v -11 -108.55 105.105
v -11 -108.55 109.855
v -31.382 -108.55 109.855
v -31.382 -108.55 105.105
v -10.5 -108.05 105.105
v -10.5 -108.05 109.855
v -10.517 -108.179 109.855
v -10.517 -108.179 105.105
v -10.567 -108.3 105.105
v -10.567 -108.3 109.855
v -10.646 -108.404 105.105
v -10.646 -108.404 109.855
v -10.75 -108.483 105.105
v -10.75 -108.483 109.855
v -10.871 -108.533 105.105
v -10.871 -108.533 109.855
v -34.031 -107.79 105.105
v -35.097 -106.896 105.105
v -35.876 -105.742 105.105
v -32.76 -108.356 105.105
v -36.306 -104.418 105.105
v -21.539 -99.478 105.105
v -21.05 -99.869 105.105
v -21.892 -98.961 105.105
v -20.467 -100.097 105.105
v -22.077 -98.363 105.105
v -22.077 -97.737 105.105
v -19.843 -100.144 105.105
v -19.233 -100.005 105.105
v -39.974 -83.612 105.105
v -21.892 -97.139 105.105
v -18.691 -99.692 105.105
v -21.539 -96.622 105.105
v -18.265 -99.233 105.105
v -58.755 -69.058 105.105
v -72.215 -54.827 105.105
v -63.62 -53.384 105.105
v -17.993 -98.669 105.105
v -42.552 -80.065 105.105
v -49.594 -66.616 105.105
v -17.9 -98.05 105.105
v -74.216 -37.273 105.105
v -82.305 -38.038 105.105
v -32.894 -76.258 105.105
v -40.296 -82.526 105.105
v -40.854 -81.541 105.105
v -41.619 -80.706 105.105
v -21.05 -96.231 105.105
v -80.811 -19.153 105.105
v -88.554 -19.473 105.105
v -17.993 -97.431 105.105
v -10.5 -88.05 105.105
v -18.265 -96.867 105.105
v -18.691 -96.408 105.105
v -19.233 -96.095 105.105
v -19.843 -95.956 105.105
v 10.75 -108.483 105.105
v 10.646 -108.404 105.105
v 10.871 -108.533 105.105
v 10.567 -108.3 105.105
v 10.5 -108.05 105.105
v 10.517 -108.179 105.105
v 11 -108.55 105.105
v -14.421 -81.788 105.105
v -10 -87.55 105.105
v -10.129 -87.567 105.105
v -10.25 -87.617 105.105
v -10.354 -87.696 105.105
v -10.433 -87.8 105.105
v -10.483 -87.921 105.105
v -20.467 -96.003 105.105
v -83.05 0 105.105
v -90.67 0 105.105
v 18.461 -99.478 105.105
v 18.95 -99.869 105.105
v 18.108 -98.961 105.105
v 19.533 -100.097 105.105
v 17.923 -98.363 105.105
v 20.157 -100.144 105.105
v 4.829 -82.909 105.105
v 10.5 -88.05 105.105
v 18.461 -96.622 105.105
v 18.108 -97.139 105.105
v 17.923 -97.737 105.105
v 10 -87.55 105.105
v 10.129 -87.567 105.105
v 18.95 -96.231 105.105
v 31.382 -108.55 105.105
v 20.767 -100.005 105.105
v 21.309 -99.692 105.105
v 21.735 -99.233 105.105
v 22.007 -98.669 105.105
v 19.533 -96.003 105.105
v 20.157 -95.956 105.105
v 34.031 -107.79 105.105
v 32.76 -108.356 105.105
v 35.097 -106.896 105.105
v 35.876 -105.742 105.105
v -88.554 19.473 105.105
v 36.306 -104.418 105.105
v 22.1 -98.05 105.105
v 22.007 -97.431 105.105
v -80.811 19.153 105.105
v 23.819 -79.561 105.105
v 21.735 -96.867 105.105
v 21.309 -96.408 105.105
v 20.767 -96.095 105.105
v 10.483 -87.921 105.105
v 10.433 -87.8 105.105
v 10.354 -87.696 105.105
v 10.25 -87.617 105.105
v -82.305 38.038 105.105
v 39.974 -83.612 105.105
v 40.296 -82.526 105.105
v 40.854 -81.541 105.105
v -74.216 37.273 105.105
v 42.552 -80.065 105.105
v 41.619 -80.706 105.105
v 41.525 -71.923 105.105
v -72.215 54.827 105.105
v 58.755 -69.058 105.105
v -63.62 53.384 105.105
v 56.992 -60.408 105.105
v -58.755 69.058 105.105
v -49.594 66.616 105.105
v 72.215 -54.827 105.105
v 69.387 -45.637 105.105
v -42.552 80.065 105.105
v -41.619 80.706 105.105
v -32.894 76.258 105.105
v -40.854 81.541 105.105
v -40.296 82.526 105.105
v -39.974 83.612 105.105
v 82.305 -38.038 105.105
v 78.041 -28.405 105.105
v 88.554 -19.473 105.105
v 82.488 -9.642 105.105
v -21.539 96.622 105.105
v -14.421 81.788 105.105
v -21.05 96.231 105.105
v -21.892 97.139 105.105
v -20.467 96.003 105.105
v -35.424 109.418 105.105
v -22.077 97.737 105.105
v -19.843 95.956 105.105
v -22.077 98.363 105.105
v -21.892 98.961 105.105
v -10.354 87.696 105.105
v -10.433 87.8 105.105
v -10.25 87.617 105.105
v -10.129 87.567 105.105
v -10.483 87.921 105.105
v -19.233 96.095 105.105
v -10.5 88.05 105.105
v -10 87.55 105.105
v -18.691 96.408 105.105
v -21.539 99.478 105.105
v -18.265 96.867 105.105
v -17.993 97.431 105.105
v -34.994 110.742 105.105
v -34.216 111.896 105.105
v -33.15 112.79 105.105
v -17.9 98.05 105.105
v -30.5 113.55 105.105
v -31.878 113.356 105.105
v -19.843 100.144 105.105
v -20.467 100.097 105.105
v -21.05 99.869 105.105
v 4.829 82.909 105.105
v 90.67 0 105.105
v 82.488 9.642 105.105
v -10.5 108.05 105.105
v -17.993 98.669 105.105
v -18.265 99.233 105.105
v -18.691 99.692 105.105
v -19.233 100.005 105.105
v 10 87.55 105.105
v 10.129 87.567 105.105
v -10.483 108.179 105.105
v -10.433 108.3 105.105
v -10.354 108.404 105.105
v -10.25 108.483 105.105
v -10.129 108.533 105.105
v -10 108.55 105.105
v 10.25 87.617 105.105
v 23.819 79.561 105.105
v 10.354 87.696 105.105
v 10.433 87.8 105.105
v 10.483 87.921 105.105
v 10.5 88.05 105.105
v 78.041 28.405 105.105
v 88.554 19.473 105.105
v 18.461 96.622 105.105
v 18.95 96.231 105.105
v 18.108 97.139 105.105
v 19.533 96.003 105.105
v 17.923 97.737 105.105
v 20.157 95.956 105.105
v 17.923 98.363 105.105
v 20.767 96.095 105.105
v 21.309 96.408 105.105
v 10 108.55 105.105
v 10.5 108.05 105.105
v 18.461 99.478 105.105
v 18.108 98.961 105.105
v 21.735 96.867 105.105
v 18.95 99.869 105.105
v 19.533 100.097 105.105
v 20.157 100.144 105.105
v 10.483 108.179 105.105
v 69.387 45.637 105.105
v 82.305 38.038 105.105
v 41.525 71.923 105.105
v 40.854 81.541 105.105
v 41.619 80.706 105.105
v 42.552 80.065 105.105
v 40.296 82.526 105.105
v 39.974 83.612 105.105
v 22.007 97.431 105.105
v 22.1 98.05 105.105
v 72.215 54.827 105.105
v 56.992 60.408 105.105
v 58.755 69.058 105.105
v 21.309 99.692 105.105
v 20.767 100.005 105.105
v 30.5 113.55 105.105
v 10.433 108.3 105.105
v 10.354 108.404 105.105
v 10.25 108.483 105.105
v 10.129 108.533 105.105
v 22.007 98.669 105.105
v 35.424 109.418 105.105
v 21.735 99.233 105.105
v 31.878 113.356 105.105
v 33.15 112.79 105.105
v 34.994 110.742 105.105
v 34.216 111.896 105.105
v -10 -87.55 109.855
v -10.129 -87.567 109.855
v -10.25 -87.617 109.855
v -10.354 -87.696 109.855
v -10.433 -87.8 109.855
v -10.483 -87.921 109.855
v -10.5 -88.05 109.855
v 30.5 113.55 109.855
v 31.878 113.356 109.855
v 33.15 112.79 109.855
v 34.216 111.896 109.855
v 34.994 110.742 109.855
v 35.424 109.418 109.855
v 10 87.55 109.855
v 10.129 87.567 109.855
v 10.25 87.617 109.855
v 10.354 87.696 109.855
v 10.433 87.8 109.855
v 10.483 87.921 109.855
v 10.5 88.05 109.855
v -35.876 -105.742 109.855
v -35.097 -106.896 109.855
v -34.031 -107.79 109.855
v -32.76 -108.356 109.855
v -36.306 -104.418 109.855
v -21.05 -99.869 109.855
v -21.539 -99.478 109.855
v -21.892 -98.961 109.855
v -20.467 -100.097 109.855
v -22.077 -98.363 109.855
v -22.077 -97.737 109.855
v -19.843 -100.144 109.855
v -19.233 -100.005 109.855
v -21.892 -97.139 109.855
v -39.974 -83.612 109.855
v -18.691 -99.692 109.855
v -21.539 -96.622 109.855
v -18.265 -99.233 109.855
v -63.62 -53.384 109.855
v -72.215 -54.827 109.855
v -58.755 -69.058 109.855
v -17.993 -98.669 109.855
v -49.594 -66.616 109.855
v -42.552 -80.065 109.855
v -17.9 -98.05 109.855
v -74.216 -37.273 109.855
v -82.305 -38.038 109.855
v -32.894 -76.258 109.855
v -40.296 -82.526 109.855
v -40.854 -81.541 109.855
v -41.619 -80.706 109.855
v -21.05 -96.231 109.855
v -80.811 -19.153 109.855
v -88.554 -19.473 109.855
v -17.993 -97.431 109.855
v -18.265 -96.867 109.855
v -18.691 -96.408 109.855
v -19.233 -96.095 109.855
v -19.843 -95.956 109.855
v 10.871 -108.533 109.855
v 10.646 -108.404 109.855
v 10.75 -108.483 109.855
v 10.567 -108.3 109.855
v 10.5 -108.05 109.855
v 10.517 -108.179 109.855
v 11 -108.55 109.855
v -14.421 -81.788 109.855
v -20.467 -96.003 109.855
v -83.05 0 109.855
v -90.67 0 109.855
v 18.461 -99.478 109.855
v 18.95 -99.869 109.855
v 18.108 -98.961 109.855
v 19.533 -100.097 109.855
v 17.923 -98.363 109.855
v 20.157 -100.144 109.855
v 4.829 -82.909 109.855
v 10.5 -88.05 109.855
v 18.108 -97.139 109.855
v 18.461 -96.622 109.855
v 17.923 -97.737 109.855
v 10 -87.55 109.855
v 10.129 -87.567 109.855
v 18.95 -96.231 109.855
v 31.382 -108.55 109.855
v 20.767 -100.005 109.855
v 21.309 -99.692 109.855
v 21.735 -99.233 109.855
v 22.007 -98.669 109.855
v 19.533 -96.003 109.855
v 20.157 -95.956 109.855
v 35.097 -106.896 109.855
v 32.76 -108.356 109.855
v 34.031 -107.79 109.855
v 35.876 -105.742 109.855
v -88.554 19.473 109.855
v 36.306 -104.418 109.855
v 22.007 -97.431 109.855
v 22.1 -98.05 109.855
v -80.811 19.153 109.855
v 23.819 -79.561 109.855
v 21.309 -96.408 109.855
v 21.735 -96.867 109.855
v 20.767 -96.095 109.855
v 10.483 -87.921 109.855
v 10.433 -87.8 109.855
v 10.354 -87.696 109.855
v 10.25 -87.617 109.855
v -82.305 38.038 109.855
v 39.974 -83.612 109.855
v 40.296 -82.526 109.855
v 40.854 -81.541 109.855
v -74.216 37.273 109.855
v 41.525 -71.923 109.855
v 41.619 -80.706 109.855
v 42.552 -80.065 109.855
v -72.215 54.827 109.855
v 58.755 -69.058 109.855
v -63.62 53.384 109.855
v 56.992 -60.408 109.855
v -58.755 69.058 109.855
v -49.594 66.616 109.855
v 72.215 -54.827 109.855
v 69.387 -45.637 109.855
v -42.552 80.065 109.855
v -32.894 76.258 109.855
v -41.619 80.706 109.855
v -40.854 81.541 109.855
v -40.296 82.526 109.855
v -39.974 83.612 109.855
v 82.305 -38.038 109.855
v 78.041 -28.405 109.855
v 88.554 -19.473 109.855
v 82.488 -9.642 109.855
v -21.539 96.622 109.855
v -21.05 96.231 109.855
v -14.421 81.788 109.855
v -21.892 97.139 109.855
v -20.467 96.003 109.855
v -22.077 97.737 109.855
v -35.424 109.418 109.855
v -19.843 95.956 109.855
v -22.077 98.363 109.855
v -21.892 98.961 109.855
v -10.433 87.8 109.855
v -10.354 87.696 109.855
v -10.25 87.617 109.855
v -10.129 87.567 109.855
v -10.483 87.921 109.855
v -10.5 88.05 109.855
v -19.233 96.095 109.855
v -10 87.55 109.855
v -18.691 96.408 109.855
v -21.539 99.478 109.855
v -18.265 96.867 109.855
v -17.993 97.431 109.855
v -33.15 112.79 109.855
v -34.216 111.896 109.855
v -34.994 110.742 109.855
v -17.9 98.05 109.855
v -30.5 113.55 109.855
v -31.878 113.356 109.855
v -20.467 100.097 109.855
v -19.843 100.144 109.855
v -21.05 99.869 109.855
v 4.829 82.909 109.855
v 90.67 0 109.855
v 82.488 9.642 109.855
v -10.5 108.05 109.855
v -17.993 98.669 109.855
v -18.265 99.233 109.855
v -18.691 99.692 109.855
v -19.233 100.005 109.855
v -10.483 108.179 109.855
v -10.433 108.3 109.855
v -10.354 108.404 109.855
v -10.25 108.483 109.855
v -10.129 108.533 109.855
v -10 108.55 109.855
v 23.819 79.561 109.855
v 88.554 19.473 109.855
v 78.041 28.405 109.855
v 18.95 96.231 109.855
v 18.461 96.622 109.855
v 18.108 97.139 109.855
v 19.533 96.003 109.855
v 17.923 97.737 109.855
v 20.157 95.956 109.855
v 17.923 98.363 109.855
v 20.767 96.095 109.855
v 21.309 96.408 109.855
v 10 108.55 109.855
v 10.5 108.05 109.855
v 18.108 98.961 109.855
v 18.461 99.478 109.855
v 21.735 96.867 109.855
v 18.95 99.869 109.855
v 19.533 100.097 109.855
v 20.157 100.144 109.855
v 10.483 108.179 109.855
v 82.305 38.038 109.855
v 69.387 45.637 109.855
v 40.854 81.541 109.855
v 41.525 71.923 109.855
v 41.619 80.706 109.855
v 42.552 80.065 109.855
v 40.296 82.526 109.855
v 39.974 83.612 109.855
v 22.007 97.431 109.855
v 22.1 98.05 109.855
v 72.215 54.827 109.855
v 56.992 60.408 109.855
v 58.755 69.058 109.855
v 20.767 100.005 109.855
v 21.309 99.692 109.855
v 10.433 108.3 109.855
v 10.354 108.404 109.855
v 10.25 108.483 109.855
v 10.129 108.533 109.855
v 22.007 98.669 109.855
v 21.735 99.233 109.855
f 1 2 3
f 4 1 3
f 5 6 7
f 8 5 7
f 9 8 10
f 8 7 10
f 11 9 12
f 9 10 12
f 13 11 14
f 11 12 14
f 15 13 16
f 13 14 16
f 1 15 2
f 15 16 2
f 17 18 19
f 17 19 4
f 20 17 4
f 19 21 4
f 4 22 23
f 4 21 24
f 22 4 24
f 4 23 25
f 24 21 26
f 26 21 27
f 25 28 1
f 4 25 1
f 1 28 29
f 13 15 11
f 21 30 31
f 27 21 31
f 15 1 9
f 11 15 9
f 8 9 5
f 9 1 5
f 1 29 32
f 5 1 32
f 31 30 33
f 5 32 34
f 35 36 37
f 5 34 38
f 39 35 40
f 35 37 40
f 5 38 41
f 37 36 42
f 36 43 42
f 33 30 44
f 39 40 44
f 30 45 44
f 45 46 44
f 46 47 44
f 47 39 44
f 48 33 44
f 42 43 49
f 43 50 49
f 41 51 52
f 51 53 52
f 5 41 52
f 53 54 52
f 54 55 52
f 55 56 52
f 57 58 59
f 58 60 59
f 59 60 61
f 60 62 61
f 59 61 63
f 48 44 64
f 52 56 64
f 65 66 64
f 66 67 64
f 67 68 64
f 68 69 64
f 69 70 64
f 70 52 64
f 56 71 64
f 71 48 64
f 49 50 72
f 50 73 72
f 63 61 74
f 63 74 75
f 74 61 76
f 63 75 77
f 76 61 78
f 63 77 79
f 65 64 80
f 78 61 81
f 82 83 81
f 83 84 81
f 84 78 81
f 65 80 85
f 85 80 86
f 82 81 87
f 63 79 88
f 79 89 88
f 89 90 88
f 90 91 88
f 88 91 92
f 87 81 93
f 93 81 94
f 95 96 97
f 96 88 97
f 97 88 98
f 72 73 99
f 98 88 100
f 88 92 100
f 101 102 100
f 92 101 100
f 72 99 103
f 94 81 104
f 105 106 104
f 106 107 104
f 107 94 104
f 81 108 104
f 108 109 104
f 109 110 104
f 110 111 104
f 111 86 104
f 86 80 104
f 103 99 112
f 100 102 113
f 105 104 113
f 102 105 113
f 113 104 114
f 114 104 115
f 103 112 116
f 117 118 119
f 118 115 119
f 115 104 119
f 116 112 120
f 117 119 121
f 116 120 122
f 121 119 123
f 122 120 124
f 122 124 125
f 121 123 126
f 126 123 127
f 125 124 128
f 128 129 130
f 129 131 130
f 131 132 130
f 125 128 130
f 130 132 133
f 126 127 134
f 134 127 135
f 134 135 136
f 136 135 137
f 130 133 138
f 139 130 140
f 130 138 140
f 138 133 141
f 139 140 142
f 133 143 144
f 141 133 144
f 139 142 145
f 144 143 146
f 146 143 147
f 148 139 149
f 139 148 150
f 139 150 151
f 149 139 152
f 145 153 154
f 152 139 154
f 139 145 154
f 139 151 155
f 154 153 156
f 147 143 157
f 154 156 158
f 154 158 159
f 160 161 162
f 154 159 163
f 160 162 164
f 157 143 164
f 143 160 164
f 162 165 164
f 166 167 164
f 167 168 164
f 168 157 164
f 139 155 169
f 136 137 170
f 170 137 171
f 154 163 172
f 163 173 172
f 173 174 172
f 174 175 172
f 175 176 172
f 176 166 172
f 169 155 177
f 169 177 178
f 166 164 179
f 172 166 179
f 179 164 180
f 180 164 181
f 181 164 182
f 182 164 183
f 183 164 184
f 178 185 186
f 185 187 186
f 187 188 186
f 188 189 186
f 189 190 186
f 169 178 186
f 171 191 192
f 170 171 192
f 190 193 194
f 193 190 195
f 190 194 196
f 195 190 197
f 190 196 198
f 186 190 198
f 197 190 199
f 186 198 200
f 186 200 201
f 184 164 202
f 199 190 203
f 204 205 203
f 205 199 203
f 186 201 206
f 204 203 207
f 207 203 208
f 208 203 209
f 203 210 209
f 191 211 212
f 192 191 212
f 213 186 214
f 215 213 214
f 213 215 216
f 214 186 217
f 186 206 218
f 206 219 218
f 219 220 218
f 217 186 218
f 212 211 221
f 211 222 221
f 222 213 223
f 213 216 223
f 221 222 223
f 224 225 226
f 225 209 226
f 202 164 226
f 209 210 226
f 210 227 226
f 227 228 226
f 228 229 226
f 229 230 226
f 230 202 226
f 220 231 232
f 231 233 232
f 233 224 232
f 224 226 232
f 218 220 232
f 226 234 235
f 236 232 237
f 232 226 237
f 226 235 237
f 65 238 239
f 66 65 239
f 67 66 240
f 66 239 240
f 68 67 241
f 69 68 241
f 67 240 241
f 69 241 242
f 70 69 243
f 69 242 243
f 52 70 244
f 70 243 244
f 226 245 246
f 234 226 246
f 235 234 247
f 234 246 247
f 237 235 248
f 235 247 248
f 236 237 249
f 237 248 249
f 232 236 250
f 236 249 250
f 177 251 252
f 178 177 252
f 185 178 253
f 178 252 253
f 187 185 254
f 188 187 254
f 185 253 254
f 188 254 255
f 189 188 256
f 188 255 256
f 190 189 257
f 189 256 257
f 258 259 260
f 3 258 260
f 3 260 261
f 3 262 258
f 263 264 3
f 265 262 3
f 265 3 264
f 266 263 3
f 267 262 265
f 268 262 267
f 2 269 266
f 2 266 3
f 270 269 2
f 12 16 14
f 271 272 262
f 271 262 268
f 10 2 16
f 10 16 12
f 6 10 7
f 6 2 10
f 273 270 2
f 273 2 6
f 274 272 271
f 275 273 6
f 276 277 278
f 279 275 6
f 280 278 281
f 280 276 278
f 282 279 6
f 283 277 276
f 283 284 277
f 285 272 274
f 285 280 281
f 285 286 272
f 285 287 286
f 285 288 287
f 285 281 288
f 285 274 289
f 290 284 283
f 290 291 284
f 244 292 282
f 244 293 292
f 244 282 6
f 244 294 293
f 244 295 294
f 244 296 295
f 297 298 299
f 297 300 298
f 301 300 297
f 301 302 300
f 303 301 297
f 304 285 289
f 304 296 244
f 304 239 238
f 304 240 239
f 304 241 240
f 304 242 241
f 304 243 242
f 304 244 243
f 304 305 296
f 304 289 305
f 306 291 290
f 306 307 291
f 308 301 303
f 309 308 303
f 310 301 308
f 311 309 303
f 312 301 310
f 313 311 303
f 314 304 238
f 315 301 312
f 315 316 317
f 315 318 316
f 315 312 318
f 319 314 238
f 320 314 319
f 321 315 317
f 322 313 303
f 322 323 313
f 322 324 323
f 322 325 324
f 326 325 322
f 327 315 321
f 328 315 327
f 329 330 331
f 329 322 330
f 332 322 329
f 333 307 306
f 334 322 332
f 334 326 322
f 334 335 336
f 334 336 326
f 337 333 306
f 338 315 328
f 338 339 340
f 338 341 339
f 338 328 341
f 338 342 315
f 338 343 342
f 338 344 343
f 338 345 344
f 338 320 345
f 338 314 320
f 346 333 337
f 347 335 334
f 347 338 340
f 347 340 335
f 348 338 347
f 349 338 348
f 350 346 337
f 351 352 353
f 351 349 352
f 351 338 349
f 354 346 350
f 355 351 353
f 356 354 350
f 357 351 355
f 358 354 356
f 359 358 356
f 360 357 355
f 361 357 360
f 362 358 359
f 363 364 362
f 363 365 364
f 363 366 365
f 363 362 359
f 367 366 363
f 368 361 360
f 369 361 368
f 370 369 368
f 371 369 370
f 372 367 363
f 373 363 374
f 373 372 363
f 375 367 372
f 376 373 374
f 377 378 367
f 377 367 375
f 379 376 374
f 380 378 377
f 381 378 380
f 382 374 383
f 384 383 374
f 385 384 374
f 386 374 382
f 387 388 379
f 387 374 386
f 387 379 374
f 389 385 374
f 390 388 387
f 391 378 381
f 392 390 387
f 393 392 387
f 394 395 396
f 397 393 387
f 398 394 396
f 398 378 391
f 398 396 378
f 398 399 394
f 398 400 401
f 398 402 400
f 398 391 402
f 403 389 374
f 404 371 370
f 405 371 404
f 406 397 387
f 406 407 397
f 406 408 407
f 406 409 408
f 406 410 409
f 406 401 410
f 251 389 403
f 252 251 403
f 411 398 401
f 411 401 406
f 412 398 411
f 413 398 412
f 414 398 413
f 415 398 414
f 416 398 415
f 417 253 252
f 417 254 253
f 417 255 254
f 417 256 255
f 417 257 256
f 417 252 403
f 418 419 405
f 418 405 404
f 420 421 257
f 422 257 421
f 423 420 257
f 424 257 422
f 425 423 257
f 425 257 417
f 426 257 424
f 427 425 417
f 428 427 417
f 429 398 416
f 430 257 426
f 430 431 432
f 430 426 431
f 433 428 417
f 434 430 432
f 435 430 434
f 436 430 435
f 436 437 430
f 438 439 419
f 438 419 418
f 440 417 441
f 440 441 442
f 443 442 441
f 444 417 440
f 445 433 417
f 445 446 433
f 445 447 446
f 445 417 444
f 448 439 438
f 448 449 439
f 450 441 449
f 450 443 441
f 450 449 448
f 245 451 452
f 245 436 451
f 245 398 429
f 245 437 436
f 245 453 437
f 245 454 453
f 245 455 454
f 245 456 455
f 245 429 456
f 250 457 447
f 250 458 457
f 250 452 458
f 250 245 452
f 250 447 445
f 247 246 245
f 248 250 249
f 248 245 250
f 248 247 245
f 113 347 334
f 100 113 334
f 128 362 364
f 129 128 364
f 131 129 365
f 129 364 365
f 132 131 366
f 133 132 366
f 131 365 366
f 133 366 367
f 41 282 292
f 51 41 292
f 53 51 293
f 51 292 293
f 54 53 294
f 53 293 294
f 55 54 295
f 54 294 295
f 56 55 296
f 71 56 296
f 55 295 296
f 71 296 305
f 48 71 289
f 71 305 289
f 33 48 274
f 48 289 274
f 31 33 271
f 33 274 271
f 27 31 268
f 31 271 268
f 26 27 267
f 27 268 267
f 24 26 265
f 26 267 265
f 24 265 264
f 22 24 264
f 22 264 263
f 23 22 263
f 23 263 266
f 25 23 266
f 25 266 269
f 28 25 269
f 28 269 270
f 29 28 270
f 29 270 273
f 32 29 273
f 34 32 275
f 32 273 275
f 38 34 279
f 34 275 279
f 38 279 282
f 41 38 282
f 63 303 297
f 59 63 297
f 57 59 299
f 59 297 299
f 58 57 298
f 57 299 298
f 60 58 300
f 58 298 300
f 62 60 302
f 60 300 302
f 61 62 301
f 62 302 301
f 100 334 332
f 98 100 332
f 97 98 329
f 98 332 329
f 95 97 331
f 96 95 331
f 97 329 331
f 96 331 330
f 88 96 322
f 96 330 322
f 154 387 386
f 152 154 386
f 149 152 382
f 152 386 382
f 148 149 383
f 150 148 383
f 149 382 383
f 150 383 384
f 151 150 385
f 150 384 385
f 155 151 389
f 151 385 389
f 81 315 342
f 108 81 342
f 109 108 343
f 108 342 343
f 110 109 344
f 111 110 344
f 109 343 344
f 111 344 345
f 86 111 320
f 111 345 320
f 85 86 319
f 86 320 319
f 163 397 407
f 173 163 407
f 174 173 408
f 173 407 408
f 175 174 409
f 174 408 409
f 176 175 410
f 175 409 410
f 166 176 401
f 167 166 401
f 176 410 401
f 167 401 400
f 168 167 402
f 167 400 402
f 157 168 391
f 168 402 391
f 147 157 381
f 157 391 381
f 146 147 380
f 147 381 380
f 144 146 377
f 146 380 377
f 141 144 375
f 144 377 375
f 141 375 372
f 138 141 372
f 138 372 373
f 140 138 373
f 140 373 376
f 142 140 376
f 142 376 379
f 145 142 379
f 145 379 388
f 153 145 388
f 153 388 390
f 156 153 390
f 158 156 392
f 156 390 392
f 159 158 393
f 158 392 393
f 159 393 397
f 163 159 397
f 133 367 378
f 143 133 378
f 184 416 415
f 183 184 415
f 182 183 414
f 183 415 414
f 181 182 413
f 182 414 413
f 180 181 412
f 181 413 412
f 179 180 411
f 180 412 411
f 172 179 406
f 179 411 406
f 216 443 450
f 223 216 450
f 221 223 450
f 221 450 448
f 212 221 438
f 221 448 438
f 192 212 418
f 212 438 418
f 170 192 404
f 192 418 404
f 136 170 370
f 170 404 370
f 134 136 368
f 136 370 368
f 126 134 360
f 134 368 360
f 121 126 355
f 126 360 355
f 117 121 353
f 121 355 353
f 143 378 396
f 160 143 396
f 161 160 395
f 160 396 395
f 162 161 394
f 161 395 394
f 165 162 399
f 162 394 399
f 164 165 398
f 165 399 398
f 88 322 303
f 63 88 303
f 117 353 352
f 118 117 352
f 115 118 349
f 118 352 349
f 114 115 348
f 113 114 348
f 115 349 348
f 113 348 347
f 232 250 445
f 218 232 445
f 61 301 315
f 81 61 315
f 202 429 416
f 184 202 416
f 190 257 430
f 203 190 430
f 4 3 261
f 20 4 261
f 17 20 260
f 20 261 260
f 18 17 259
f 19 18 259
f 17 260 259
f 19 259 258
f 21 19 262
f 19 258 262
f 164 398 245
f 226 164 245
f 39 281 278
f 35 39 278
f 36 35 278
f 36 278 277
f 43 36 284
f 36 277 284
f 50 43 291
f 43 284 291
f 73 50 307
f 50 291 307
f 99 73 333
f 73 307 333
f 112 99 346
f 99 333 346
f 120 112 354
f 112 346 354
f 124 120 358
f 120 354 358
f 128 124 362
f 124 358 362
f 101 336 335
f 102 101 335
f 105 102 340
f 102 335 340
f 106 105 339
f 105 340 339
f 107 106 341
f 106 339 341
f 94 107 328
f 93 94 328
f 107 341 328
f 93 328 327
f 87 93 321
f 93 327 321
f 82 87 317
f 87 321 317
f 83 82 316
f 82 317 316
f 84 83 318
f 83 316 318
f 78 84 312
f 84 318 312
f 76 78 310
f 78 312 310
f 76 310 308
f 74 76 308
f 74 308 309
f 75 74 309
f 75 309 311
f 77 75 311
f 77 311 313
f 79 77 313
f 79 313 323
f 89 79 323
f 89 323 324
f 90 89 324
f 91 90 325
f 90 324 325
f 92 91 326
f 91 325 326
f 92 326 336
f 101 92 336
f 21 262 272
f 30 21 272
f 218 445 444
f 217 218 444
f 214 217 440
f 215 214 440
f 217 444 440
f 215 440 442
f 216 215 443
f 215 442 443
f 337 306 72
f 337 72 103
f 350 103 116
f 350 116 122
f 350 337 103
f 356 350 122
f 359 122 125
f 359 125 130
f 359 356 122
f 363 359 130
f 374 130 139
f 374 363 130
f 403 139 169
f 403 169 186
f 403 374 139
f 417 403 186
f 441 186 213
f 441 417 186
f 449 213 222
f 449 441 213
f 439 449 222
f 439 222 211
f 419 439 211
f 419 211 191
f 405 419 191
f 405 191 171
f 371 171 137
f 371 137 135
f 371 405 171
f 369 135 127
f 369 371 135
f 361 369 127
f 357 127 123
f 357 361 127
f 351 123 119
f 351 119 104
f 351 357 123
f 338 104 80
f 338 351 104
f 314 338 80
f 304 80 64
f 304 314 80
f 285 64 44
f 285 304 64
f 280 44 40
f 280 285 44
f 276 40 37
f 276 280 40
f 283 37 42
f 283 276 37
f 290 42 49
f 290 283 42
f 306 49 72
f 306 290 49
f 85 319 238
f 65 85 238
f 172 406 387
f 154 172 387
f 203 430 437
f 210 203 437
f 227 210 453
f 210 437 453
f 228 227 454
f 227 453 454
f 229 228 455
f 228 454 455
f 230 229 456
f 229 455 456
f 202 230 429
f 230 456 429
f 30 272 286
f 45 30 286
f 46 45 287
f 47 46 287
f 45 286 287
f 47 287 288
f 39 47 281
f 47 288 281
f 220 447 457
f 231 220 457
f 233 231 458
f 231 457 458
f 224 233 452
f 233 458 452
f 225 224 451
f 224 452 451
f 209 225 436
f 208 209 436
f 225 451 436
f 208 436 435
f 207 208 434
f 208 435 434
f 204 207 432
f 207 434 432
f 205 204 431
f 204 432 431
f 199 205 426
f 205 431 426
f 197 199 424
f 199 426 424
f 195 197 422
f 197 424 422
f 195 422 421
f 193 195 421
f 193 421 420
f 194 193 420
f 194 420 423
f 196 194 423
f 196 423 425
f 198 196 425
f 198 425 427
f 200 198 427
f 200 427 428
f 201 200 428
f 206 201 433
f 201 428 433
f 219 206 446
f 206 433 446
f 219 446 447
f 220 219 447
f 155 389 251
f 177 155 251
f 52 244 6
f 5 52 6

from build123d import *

# Parameters (mm, degrees)
SKETCH2_R           = 83.05
SKETCH2_R_2         = 2.75
BOSS_EXTRUDE1_DEPTH = 4.7498
SKETCH3_R           = 2.75
SKETCH3_R_2         = 2.1
BOSS_EXTRUDE2_DEPTH = 4.7498


with BuildPart() as part:
    # Sketch2 → Boss-Extrude1 (new body)
    with BuildSketch(Plane(origin=(0, 0, 109.855), x_dir=(-1, 0, 0), z_dir=(0, 0, -1))):
        with BuildLine():
            Line((-31.381634904, -108.55), (-11, -108.55))
            ThreePointArc((-11, -108.55), (-10.646446609, -108.403553391), (-10.5, -108.05))
            Line((-10.5, -108.05), (-10.5, -88.05))
            ThreePointArc((-10.5, -88.05), (-10.353553391, -87.696446609), (-10, -87.55))
            Line((-10, -87.55), (10, -87.55))
            ThreePointArc((10, -87.55), (10.353553391, -87.696446609), (10.5, -88.05))
            Line((10.5, -88.05), (10.5, -108.05))
            ThreePointArc((10.5, -108.05), (10.646446609, -108.403553391), (11, -108.55))
            Line((11, -108.55), (31.381634904, -108.55))
            ThreePointArc((31.381634904, -108.55), (34.595572952, -107.380222216), (36.305673669, -104.418240888))
            Line((36.305673669, -104.418240888), (39.974409604, -83.611805478))
            ThreePointArc((39.974409604, -83.611805478), (40.853639928, -81.540739531), (42.55192133, -80.064866772))
            ThreePointArc((42.55192133, -80.064866772), (90.67, 0), (42.55192133, 80.064866772))
            ThreePointArc((42.55192133, 80.064866772), (40.853639928, 81.540739531), (39.974409604, 83.611805478))
            Line((39.974409604, 83.611805478), (35.424038765, 109.418240888))
            ThreePointArc((35.424038765, 109.418240888), (33.713938048, 112.380222216), (30.5, 113.55))
            Line((30.5, 113.55), (-30.5, 113.55))
            ThreePointArc((-30.5, 113.55), (-33.713938048, 112.380222216), (-35.424038765, 109.418240888))
            Line((-35.424038765, 109.418240888), (-39.974409604, 83.611805478))
            ThreePointArc((-39.974409604, 83.611805478), (-40.853639928, 81.540739531), (-42.55192133, 80.064866772))
            ThreePointArc((-42.55192133, 80.064866772), (-90.67, 0), (-42.55192133, -80.064866772))
            ThreePointArc((-42.55192133, -80.064866772), (-40.853639928, -81.540739531), (-39.974409604, -83.611805478))
            Line((-39.974409604, -83.611805478), (-36.305673669, -104.418240888))
            ThreePointArc((-36.305673669, -104.418240888), (-34.595572952, -107.380222216), (-31.381634904, -108.55))
        make_face()
        Circle(SKETCH2_R, mode=Mode.SUBTRACT)
        with Locations((20, 98.05)):
            Circle(SKETCH2_R_2, mode=Mode.SUBTRACT)
        with Locations((-20, 98.05)):
            Circle(SKETCH2_R_2, mode=Mode.SUBTRACT)
        with Locations((20, -98.05)):
            Circle(SKETCH2_R_2, mode=Mode.SUBTRACT)
        with Locations((-20, -98.05)):
            Circle(SKETCH2_R_2, mode=Mode.SUBTRACT)
        with BuildLine():
            Line((10, 87.55), (-10, 87.55))
            ThreePointArc((-10, 87.55), (-10.353553391, 87.696446609), (-10.5, 88.05))
            Line((-10.5, 88.05), (-10.5, 108.05))
            ThreePointArc((-10.5, 108.05), (-10.353553391, 108.403553391), (-10, 108.55))
            Line((-10, 108.55), (10, 108.55))
            ThreePointArc((10, 108.55), (10.353553391, 108.403553391), (10.5, 108.05))
            Line((10.5, 108.05), (10.5, 88.05))
            ThreePointArc((10.5, 88.05), (10.353553391, 87.696446609), (10, 87.55))
        make_face(mode=Mode.SUBTRACT)
    extrude(amount=BOSS_EXTRUDE1_DEPTH)

    # Sketch3 → Boss-Extrude2 (add)
    # profile 1 of 4: a face of its own
    with BuildSketch(Plane.XY.offset(109.855)):
        with Locations((-20, 98.05)):
            Circle(SKETCH3_R)
        with Locations((-20, 98.05)):
            Circle(SKETCH3_R_2, mode=Mode.SUBTRACT)
    # profile 2 of 4: a face of its own
    with BuildSketch(Plane.XY.offset(109.855)):
        with Locations((20, 98.05)):
            Circle(SKETCH3_R)
        with Locations((20, 98.05)):
            Circle(SKETCH3_R_2, mode=Mode.SUBTRACT)
    # profile 3 of 4: a face of its own
    with BuildSketch(Plane.XY.offset(109.855)):
        with Locations((20, -98.05)):
            Circle(SKETCH3_R)
        with Locations((20, -98.05)):
            Circle(SKETCH3_R_2, mode=Mode.SUBTRACT)
    # profile 4 of 4: a face of its own
    with BuildSketch(Plane.XY.offset(109.855)):
        with Locations((-20, -98.05)):
            Circle(SKETCH3_R)
        with Locations((-20, -98.05)):
            Circle(SKETCH3_R_2, mode=Mode.SUBTRACT)
    extrude(amount=-BOSS_EXTRUDE2_DEPTH)


solid = part.part
